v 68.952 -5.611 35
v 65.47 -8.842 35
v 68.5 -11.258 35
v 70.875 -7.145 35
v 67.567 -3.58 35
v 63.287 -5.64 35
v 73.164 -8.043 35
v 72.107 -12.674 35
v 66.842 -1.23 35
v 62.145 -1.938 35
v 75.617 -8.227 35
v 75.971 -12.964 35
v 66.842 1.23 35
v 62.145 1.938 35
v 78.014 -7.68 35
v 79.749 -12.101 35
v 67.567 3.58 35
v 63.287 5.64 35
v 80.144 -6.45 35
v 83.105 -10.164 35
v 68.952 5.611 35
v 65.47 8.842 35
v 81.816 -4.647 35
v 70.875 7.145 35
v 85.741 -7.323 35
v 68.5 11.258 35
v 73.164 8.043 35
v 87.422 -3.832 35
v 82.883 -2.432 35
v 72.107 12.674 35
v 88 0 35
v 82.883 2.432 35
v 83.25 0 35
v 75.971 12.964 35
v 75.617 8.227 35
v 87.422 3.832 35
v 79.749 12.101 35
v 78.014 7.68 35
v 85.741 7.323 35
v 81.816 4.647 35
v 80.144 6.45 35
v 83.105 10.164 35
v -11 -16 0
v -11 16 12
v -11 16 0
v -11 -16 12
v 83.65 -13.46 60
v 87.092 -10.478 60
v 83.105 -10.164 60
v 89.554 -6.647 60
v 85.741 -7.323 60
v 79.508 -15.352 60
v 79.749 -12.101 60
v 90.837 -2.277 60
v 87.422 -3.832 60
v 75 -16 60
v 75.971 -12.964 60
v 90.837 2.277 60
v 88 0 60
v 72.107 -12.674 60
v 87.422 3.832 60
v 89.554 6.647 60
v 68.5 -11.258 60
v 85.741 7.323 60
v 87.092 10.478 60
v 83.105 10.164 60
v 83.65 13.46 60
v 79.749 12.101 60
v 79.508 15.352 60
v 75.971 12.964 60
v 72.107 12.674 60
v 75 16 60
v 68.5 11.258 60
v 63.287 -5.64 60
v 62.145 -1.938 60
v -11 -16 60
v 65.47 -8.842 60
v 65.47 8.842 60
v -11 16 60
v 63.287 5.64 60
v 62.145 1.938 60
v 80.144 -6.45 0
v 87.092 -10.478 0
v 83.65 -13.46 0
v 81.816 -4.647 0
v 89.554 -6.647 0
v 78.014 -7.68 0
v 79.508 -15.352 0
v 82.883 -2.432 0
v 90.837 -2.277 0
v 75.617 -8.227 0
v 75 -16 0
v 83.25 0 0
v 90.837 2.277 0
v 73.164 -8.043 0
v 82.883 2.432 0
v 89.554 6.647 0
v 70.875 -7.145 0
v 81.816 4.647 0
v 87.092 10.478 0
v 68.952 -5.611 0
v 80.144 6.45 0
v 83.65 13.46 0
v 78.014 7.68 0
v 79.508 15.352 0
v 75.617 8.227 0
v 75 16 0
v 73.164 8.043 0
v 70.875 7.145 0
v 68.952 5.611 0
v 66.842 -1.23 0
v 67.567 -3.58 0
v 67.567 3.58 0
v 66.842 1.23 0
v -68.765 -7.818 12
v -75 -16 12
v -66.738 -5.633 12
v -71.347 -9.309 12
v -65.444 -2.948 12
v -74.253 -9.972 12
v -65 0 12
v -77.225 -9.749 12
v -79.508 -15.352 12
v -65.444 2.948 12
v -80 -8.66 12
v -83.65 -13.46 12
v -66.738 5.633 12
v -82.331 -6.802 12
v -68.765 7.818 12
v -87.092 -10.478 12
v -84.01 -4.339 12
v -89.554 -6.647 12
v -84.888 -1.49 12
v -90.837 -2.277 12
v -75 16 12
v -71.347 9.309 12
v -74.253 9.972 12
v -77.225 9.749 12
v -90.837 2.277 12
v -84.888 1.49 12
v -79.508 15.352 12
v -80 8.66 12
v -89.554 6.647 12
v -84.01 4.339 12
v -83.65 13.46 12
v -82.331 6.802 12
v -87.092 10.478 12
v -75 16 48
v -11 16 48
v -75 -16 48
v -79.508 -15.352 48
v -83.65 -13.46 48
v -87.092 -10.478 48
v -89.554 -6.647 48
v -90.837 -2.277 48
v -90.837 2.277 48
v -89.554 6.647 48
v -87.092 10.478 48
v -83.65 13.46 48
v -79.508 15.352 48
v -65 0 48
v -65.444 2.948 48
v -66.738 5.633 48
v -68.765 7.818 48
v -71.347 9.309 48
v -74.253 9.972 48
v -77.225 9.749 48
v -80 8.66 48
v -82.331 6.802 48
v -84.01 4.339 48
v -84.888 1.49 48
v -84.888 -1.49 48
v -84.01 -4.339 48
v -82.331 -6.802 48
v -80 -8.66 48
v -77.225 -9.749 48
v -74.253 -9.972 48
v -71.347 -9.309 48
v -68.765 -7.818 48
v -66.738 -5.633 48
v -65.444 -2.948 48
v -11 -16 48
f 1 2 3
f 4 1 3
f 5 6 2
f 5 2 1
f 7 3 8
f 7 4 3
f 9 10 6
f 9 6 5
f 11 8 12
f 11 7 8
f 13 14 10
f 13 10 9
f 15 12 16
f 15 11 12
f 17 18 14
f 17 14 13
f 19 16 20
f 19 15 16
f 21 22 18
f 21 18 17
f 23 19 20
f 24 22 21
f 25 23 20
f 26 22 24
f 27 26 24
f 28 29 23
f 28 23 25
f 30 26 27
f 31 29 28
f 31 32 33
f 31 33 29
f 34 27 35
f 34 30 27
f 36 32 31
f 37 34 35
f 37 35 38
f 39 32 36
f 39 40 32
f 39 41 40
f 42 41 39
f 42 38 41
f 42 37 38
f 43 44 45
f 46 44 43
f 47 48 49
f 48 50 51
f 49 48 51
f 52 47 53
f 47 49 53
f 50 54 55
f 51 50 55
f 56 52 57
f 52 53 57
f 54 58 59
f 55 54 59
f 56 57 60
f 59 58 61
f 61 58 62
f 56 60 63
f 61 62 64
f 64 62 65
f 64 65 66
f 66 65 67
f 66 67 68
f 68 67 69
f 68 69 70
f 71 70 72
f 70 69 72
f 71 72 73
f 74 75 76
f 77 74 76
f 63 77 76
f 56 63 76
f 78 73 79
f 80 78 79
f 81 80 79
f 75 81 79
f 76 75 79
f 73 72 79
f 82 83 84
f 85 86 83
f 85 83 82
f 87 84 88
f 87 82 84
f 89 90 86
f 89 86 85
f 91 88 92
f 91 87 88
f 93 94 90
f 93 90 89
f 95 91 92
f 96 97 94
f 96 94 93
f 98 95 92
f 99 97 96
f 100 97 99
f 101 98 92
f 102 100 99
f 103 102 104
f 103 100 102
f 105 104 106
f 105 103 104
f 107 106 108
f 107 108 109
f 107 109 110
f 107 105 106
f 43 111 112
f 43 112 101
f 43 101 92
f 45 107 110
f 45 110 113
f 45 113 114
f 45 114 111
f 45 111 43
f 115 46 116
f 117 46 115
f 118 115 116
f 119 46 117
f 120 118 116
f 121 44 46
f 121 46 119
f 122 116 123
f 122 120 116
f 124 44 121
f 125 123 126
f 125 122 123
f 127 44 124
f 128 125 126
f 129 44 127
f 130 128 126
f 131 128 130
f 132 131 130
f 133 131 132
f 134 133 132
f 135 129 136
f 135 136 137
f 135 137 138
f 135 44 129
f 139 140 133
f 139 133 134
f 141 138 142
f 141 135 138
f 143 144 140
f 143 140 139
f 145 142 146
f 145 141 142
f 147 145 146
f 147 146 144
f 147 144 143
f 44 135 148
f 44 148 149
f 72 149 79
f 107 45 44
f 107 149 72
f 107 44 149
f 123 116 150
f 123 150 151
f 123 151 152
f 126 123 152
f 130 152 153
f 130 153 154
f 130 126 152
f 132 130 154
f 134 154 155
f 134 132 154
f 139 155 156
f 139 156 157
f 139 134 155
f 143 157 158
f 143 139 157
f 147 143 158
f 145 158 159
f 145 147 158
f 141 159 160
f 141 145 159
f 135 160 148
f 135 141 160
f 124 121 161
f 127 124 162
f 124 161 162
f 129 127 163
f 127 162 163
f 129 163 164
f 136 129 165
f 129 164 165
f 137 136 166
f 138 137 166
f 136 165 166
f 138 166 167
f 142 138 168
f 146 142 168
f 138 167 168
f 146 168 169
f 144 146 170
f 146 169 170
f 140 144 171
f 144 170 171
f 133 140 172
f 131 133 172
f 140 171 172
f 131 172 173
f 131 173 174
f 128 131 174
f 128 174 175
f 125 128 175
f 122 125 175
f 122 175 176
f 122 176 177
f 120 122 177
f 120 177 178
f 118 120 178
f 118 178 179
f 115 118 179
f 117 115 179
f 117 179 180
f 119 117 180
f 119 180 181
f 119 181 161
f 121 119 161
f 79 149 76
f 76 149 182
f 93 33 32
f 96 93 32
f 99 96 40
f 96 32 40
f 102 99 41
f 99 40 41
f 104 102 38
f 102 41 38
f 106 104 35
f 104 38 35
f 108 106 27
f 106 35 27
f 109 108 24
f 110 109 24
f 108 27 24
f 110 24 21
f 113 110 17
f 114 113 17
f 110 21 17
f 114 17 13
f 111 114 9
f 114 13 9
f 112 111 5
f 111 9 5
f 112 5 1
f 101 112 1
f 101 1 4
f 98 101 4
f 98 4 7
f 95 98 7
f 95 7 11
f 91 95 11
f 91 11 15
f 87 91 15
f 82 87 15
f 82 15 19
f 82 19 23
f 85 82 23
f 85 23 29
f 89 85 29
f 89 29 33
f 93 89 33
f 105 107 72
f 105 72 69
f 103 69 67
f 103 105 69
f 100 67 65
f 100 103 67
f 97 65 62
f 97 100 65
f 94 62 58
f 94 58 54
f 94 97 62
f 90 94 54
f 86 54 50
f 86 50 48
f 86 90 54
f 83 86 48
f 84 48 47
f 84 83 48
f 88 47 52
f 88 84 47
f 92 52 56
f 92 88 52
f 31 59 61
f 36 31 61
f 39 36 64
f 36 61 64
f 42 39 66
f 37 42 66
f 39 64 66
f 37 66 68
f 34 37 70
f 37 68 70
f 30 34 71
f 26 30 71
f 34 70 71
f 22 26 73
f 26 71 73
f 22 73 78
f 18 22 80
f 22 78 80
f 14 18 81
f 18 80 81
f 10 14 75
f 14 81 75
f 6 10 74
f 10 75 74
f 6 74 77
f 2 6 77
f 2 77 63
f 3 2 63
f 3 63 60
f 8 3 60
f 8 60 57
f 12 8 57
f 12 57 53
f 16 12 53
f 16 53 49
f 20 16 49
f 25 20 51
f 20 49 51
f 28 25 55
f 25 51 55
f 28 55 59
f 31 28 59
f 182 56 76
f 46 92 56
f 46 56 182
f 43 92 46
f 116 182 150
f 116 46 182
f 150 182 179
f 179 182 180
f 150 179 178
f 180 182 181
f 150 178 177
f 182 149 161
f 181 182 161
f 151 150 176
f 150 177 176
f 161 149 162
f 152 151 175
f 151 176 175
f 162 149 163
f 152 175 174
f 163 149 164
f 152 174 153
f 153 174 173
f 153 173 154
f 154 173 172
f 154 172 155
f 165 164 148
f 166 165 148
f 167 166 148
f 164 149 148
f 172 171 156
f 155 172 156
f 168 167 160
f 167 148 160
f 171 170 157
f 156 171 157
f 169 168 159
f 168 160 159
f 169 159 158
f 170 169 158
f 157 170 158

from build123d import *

# Parameters (mm, degrees)
EXTRUDE_1_DEPTH     = 60
SKETCH_2_R          = 13
CUT_EXTRUDE_1_DEPTH = 25
CUT_EXTRUDE_3_REACH = 100.803
SKETCH_3_R          = 8.25
CUT_EXTRUDE_4_REACH = 112.168
SKETCH_4_R          = 10
CUT_EXTRUDE_START   = -12
CUT_EXTRUDE_5_DEPTH = 12


with BuildPart() as part:
    # 草图1 → 凸台-拉伸1 (new body)
    with BuildSketch(Plane.XY):
        with BuildLine():
            Line((-75, 16), (75, 16))
            ThreePointArc((75, 16), (91, 0), (75, -16))
            Line((75, -16), (-75, -16))
            ThreePointArc((-75, -16), (-91, 0), (-75, 16))
        make_face()
    extrude(amount=EXTRUDE_1_DEPTH)

    # 草图2 → 切除-拉伸1 (cut)
    with BuildSketch(Plane.XY.offset(60)):
        with Locations((75, 0)):
            Circle(SKETCH_2_R)
    extrude(amount=-CUT_EXTRUDE_1_DEPTH, mode=Mode.SUBTRACT)

    # 草图3 → 切除-拉伸3 (cut, up to next)
    with BuildSketch(Plane.XY.offset(35), mode=Mode.PRIVATE) as cut_extrude_3_sk1:
        with Locations((75, 0)):
            Circle(SKETCH_3_R)
    cut_extrude_3_tool1 = extrude(cut_extrude_3_sk1.sketch, amount=-CUT_EXTRUDE_3_REACH, mode=Mode.PRIVATE) & part.part
    add(cut_extrude_3_tool1.solids().sort_by_distance((75, 0, 35))[0], mode=Mode.SUBTRACT)

    # 草图4 → 切除-拉伸4 (cut, up to next)
    with BuildSketch(Plane.XY.offset(60), mode=Mode.PRIVATE) as cut_extrude_4_sk1:
        with Locations((-75, 0)):
            Circle(SKETCH_4_R)
    cut_extrude_4_tool1 = extrude(cut_extrude_4_sk1.sketch, amount=-CUT_EXTRUDE_4_REACH, mode=Mode.PRIVATE) & part.part
    add(cut_extrude_4_tool1.solids().sort_by_distance((-75, 0, 60))[0], mode=Mode.SUBTRACT)

    # 草图5 → 切除-拉伸5 (cut)
    with BuildSketch(Plane.XY.offset(60).offset(CUT_EXTRUDE_START)):
        with BuildLine():
            Line((-11, 16), (-11, -16))
            Line((-11, -16), (-75, -16))
            ThreePointArc((-75, -16), (-91, 0), (-75, 16))
            Line((-75, 16), (-11, 16))
        make_face()
    cut_extrude_5 = extrude(amount=CUT_EXTRUDE_5_DEPTH, mode=Mode.SUBTRACT)

    # 镜向1: 切除-拉伸5 across plane
    add(cut_extrude_5.mirror(Plane.XY.offset(30)), mode=Mode.SUBTRACT)


solid = part.part
